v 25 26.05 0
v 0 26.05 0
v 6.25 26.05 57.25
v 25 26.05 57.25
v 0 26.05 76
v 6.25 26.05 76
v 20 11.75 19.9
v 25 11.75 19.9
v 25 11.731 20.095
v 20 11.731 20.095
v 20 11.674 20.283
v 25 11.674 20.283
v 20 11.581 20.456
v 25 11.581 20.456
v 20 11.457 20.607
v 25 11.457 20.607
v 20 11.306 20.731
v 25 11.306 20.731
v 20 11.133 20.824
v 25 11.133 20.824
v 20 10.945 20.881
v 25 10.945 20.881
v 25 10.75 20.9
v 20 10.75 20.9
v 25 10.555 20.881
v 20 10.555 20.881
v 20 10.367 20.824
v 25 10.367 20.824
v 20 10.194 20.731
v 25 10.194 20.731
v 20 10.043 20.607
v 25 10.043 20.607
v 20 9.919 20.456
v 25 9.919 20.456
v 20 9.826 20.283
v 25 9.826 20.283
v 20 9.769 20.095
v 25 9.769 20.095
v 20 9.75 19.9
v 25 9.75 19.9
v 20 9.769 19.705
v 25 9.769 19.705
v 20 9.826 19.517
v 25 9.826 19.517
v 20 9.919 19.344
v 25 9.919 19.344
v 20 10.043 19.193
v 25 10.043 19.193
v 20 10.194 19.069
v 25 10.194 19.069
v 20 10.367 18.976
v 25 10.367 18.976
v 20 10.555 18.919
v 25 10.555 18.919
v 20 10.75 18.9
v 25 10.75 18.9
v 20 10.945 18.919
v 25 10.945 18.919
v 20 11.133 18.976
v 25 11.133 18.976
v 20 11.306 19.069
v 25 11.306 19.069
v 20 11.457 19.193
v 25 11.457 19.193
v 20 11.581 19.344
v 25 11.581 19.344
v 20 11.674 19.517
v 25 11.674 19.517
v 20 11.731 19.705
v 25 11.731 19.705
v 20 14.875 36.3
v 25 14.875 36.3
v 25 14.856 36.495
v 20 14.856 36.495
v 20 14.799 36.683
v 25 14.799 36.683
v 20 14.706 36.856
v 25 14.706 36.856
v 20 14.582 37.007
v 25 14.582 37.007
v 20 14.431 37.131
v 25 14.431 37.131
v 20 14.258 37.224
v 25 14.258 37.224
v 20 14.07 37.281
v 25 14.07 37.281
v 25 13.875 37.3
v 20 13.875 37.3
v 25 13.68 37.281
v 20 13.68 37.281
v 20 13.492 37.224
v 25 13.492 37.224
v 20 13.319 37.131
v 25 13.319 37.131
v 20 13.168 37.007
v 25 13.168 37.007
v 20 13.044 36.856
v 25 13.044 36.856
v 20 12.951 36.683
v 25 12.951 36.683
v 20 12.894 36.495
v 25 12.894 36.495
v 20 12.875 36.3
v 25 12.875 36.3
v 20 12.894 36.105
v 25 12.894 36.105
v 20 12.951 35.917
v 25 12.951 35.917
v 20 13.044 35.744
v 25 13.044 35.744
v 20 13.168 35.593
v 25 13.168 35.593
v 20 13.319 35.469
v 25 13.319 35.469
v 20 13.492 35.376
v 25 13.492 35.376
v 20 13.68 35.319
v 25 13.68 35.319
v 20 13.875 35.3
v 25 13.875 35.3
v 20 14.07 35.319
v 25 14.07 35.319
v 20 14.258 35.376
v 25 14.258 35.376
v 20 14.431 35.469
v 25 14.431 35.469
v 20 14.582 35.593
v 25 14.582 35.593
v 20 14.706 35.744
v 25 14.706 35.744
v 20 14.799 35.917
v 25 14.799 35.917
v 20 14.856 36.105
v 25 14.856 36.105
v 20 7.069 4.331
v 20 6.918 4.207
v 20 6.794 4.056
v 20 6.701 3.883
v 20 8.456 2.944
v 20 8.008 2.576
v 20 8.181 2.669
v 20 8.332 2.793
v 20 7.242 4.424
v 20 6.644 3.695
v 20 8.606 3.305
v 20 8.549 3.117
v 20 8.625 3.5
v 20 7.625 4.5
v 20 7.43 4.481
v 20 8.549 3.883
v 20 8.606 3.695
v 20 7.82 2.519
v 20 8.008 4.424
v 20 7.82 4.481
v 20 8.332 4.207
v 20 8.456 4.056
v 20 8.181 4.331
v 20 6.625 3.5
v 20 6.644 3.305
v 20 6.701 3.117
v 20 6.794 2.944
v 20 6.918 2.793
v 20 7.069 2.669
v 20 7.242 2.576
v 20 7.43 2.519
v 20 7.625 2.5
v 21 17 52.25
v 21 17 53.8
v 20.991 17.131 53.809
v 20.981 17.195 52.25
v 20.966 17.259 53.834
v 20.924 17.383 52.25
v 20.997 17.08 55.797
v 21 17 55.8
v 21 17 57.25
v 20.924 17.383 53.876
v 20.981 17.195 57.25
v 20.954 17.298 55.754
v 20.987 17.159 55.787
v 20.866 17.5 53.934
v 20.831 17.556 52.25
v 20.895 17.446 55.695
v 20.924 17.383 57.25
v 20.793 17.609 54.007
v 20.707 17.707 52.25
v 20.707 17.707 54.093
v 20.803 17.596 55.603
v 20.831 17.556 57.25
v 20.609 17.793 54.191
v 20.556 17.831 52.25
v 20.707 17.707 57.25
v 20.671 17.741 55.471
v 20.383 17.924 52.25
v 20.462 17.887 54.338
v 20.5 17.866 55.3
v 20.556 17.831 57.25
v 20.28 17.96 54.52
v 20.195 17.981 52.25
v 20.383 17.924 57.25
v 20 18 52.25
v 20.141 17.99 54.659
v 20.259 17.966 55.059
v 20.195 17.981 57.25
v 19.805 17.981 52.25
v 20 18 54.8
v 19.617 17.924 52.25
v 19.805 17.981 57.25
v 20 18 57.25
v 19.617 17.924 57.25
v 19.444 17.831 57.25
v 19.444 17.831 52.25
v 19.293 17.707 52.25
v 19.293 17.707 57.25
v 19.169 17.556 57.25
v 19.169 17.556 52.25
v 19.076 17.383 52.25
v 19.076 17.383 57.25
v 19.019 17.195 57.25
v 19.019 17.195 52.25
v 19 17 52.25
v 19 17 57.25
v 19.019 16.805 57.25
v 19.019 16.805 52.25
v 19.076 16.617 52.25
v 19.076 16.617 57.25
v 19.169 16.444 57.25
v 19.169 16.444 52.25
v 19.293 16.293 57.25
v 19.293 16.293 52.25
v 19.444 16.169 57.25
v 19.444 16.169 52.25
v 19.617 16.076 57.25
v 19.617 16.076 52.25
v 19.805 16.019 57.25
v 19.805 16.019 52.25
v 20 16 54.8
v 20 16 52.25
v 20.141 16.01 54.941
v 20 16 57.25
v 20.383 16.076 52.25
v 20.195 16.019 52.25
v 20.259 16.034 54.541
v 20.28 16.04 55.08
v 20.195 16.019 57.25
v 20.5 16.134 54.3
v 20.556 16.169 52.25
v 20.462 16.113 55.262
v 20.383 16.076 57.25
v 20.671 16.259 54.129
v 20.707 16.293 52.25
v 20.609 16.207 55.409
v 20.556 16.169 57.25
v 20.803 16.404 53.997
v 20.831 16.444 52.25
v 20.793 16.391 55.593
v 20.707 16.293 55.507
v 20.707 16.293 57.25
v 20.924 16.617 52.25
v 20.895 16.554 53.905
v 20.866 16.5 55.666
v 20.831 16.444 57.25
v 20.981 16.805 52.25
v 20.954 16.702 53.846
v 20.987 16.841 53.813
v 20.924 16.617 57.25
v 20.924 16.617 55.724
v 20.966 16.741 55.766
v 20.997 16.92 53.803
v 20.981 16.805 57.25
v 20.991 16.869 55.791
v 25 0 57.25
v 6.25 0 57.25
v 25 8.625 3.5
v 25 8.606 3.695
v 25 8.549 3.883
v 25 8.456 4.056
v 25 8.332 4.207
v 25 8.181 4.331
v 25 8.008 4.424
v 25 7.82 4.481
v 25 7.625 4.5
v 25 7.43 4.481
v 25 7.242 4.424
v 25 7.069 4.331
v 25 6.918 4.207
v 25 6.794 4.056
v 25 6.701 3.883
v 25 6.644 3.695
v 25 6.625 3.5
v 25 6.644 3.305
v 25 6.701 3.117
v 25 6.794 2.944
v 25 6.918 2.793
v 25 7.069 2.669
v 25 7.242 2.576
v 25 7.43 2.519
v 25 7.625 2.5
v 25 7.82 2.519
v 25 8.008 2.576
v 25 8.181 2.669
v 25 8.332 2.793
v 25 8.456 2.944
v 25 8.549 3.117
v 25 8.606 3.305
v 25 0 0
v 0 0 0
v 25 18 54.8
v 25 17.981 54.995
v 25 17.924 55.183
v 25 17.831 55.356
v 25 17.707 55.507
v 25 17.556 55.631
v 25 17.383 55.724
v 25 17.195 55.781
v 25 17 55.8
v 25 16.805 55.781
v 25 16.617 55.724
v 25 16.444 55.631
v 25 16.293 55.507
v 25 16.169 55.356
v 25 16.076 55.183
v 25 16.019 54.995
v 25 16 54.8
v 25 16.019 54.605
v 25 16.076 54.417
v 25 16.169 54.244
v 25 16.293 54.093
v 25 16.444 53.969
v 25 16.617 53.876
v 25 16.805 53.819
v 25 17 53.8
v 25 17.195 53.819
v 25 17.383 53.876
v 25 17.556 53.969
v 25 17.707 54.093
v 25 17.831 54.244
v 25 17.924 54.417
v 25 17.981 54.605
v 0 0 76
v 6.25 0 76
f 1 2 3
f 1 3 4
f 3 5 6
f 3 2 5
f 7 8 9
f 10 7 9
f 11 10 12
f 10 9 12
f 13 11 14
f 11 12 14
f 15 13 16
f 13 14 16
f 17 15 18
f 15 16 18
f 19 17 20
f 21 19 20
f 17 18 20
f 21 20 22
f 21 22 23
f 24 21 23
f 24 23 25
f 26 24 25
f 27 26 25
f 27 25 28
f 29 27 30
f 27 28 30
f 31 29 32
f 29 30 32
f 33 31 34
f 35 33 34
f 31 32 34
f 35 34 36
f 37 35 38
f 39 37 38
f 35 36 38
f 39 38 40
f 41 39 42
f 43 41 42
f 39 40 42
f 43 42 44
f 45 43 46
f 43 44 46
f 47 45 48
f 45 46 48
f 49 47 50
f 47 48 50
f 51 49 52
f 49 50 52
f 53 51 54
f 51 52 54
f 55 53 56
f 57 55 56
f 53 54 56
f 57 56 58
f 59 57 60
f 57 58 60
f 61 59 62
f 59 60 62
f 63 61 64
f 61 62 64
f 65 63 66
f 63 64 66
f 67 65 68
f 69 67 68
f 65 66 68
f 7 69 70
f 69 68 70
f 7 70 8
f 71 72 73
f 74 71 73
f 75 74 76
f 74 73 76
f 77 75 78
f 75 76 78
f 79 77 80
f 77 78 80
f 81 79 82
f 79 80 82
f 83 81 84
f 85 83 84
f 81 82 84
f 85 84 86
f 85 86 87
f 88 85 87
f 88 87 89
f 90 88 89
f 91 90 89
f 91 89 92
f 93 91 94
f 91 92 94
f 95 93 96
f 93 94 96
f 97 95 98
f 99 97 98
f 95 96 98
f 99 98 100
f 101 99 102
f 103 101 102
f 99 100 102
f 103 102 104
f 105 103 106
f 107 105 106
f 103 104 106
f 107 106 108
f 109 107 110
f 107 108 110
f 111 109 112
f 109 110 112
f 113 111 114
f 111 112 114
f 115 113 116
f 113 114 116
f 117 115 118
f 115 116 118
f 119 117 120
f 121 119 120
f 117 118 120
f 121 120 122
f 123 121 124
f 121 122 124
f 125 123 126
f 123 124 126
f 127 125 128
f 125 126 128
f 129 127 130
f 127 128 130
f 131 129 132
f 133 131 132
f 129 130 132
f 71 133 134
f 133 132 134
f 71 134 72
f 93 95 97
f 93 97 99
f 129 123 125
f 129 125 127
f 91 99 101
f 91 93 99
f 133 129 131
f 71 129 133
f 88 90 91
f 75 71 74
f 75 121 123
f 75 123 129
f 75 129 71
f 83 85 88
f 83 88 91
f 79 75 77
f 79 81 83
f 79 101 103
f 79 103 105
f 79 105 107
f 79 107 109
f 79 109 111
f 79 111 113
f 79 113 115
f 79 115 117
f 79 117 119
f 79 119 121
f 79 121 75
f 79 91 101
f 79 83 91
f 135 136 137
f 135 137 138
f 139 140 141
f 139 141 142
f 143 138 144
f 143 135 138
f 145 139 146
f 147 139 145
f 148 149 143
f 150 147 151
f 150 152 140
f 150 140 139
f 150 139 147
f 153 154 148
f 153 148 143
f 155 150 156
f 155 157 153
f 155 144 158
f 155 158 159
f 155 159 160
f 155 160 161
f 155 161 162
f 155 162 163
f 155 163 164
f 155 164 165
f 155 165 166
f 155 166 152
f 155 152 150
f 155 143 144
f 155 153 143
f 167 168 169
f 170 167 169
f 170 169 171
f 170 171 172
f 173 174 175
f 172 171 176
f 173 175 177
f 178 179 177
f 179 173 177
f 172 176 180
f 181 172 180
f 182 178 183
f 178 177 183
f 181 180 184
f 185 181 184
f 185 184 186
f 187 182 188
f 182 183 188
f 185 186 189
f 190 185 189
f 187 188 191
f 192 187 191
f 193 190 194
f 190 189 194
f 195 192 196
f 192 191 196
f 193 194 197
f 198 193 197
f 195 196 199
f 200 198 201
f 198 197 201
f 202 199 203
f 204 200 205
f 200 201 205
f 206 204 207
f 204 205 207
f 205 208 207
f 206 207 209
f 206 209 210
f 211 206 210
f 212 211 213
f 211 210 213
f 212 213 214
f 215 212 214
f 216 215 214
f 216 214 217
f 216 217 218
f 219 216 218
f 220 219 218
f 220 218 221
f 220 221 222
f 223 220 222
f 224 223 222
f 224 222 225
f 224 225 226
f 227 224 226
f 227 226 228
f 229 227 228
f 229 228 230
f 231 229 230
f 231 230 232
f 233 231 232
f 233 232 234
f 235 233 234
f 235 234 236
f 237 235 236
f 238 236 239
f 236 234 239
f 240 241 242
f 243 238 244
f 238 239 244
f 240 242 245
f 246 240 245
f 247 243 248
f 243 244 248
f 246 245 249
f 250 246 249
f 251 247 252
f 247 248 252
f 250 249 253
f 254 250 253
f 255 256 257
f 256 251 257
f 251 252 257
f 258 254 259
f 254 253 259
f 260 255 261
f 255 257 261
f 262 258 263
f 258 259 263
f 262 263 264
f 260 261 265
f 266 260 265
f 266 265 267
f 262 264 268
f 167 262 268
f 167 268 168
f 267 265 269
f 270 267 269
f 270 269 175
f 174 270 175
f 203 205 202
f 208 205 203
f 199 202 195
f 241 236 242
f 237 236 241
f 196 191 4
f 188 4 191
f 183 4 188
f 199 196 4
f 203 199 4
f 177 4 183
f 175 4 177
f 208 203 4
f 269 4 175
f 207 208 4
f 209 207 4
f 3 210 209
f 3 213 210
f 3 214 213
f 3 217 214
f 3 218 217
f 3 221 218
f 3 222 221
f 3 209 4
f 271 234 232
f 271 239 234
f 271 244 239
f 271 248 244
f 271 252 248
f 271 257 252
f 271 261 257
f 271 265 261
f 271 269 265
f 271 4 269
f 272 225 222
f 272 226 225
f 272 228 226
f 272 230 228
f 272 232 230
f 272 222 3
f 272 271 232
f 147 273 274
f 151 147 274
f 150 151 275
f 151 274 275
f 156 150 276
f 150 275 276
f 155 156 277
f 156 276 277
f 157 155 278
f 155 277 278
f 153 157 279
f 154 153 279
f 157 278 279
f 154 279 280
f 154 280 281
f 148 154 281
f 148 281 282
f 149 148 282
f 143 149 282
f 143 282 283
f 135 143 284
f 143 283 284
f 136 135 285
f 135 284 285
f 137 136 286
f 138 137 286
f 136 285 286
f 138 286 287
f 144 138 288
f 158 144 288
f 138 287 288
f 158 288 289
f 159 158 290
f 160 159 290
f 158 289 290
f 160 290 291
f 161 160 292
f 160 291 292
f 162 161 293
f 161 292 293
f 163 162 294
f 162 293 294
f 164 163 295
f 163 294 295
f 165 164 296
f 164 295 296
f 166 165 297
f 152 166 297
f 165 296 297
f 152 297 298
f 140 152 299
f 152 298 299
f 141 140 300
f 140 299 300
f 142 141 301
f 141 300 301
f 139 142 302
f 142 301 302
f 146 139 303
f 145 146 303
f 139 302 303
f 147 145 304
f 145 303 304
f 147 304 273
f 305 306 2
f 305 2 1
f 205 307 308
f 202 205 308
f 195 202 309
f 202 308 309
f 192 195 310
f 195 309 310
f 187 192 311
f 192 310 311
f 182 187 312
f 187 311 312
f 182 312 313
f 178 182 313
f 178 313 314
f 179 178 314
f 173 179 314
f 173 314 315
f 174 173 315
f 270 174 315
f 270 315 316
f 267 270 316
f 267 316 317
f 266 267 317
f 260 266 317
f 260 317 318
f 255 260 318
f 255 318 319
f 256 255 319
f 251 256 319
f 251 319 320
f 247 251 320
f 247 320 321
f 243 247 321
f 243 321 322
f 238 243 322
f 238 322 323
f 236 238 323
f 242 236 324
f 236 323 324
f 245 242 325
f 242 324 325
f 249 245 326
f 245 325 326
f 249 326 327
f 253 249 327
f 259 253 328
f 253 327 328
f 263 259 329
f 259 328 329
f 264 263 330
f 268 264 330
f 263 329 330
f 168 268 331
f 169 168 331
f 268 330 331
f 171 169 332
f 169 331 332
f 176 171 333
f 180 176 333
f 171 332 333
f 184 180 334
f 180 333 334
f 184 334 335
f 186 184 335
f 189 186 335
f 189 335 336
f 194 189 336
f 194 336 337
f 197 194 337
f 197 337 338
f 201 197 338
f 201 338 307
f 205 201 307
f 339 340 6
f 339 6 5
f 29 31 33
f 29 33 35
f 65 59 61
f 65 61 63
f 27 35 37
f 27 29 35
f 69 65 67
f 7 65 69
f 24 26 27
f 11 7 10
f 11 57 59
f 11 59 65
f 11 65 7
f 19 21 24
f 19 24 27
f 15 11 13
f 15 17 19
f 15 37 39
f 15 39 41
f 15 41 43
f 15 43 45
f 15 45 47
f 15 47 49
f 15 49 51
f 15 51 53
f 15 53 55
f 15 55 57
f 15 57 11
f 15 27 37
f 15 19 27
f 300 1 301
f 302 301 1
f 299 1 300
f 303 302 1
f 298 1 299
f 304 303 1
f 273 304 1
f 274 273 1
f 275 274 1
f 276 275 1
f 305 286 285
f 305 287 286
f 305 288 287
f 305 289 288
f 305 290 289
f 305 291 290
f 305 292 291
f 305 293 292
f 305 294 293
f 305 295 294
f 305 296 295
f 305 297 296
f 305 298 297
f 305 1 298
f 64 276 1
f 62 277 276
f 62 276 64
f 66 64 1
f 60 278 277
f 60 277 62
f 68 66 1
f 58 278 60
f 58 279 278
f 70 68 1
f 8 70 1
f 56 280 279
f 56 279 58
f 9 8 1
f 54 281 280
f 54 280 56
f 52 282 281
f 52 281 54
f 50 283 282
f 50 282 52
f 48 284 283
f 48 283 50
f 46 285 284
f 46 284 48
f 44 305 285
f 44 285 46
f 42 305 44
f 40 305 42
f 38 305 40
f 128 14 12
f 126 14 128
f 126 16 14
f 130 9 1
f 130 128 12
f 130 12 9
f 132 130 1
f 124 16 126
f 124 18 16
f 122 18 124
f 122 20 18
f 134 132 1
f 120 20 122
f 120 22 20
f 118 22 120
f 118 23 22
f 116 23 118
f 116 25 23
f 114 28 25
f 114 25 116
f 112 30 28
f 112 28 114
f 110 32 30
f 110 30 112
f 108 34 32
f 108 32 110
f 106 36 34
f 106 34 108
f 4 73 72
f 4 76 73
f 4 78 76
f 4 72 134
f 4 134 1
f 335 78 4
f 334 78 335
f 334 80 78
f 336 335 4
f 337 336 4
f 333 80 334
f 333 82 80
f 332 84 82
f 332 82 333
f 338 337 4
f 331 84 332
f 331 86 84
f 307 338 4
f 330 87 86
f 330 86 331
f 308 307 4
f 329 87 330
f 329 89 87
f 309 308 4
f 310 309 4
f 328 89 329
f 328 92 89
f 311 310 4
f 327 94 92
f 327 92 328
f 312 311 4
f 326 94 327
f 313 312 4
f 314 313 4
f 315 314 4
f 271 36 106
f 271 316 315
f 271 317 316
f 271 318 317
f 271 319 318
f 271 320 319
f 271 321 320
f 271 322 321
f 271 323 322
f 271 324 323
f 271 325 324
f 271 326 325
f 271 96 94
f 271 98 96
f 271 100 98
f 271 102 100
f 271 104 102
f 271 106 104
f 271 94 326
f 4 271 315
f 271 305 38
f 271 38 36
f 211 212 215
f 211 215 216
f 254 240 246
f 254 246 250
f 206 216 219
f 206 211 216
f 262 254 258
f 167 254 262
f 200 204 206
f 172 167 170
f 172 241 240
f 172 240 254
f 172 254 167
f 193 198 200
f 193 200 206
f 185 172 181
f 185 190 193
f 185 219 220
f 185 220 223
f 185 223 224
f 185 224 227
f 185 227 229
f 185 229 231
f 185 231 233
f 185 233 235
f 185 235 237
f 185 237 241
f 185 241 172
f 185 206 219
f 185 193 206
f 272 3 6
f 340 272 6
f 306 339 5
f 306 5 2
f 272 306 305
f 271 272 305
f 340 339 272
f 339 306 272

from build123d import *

# Parameters (mm, degrees)
F1_DEPTH = 26.05
F2_R     = 1
F3_DEPTH = 5
F4_R     = 1
F5_DEPTH = 5


with BuildPart() as f1:
    # F0 (on Front) → F1 (new body)
    with BuildSketch(Plane.XZ):
        Polygon((0, 76), (0, 0), (25, 0), (25, 57.25), (6.25, 57.25), (6.25, 76), align=None)
    extrude(amount=-F1_DEPTH)

    # F2 (on face) → F3 (cut)
    with BuildSketch(Plane.YZ.offset(25)):
        with Locations((17, 54.8)):
            Circle(F2_R)
        with Locations((13.875, 36.3)):
            Circle(F2_R)
        with Locations((10.75, 19.9)):
            Circle(F2_R)
        with Locations((7.625, 3.5)):
            Circle(F2_R)
    extrude(amount=-F3_DEPTH, mode=Mode.SUBTRACT)

    # F4 (on face) → F5 (cut)
    with BuildSketch(Plane.XY.offset(57.25)):
        with Locations((20, 17)):
            Circle(F4_R)
    extrude(amount=-F5_DEPTH, mode=Mode.SUBTRACT)


solid = f1.part
